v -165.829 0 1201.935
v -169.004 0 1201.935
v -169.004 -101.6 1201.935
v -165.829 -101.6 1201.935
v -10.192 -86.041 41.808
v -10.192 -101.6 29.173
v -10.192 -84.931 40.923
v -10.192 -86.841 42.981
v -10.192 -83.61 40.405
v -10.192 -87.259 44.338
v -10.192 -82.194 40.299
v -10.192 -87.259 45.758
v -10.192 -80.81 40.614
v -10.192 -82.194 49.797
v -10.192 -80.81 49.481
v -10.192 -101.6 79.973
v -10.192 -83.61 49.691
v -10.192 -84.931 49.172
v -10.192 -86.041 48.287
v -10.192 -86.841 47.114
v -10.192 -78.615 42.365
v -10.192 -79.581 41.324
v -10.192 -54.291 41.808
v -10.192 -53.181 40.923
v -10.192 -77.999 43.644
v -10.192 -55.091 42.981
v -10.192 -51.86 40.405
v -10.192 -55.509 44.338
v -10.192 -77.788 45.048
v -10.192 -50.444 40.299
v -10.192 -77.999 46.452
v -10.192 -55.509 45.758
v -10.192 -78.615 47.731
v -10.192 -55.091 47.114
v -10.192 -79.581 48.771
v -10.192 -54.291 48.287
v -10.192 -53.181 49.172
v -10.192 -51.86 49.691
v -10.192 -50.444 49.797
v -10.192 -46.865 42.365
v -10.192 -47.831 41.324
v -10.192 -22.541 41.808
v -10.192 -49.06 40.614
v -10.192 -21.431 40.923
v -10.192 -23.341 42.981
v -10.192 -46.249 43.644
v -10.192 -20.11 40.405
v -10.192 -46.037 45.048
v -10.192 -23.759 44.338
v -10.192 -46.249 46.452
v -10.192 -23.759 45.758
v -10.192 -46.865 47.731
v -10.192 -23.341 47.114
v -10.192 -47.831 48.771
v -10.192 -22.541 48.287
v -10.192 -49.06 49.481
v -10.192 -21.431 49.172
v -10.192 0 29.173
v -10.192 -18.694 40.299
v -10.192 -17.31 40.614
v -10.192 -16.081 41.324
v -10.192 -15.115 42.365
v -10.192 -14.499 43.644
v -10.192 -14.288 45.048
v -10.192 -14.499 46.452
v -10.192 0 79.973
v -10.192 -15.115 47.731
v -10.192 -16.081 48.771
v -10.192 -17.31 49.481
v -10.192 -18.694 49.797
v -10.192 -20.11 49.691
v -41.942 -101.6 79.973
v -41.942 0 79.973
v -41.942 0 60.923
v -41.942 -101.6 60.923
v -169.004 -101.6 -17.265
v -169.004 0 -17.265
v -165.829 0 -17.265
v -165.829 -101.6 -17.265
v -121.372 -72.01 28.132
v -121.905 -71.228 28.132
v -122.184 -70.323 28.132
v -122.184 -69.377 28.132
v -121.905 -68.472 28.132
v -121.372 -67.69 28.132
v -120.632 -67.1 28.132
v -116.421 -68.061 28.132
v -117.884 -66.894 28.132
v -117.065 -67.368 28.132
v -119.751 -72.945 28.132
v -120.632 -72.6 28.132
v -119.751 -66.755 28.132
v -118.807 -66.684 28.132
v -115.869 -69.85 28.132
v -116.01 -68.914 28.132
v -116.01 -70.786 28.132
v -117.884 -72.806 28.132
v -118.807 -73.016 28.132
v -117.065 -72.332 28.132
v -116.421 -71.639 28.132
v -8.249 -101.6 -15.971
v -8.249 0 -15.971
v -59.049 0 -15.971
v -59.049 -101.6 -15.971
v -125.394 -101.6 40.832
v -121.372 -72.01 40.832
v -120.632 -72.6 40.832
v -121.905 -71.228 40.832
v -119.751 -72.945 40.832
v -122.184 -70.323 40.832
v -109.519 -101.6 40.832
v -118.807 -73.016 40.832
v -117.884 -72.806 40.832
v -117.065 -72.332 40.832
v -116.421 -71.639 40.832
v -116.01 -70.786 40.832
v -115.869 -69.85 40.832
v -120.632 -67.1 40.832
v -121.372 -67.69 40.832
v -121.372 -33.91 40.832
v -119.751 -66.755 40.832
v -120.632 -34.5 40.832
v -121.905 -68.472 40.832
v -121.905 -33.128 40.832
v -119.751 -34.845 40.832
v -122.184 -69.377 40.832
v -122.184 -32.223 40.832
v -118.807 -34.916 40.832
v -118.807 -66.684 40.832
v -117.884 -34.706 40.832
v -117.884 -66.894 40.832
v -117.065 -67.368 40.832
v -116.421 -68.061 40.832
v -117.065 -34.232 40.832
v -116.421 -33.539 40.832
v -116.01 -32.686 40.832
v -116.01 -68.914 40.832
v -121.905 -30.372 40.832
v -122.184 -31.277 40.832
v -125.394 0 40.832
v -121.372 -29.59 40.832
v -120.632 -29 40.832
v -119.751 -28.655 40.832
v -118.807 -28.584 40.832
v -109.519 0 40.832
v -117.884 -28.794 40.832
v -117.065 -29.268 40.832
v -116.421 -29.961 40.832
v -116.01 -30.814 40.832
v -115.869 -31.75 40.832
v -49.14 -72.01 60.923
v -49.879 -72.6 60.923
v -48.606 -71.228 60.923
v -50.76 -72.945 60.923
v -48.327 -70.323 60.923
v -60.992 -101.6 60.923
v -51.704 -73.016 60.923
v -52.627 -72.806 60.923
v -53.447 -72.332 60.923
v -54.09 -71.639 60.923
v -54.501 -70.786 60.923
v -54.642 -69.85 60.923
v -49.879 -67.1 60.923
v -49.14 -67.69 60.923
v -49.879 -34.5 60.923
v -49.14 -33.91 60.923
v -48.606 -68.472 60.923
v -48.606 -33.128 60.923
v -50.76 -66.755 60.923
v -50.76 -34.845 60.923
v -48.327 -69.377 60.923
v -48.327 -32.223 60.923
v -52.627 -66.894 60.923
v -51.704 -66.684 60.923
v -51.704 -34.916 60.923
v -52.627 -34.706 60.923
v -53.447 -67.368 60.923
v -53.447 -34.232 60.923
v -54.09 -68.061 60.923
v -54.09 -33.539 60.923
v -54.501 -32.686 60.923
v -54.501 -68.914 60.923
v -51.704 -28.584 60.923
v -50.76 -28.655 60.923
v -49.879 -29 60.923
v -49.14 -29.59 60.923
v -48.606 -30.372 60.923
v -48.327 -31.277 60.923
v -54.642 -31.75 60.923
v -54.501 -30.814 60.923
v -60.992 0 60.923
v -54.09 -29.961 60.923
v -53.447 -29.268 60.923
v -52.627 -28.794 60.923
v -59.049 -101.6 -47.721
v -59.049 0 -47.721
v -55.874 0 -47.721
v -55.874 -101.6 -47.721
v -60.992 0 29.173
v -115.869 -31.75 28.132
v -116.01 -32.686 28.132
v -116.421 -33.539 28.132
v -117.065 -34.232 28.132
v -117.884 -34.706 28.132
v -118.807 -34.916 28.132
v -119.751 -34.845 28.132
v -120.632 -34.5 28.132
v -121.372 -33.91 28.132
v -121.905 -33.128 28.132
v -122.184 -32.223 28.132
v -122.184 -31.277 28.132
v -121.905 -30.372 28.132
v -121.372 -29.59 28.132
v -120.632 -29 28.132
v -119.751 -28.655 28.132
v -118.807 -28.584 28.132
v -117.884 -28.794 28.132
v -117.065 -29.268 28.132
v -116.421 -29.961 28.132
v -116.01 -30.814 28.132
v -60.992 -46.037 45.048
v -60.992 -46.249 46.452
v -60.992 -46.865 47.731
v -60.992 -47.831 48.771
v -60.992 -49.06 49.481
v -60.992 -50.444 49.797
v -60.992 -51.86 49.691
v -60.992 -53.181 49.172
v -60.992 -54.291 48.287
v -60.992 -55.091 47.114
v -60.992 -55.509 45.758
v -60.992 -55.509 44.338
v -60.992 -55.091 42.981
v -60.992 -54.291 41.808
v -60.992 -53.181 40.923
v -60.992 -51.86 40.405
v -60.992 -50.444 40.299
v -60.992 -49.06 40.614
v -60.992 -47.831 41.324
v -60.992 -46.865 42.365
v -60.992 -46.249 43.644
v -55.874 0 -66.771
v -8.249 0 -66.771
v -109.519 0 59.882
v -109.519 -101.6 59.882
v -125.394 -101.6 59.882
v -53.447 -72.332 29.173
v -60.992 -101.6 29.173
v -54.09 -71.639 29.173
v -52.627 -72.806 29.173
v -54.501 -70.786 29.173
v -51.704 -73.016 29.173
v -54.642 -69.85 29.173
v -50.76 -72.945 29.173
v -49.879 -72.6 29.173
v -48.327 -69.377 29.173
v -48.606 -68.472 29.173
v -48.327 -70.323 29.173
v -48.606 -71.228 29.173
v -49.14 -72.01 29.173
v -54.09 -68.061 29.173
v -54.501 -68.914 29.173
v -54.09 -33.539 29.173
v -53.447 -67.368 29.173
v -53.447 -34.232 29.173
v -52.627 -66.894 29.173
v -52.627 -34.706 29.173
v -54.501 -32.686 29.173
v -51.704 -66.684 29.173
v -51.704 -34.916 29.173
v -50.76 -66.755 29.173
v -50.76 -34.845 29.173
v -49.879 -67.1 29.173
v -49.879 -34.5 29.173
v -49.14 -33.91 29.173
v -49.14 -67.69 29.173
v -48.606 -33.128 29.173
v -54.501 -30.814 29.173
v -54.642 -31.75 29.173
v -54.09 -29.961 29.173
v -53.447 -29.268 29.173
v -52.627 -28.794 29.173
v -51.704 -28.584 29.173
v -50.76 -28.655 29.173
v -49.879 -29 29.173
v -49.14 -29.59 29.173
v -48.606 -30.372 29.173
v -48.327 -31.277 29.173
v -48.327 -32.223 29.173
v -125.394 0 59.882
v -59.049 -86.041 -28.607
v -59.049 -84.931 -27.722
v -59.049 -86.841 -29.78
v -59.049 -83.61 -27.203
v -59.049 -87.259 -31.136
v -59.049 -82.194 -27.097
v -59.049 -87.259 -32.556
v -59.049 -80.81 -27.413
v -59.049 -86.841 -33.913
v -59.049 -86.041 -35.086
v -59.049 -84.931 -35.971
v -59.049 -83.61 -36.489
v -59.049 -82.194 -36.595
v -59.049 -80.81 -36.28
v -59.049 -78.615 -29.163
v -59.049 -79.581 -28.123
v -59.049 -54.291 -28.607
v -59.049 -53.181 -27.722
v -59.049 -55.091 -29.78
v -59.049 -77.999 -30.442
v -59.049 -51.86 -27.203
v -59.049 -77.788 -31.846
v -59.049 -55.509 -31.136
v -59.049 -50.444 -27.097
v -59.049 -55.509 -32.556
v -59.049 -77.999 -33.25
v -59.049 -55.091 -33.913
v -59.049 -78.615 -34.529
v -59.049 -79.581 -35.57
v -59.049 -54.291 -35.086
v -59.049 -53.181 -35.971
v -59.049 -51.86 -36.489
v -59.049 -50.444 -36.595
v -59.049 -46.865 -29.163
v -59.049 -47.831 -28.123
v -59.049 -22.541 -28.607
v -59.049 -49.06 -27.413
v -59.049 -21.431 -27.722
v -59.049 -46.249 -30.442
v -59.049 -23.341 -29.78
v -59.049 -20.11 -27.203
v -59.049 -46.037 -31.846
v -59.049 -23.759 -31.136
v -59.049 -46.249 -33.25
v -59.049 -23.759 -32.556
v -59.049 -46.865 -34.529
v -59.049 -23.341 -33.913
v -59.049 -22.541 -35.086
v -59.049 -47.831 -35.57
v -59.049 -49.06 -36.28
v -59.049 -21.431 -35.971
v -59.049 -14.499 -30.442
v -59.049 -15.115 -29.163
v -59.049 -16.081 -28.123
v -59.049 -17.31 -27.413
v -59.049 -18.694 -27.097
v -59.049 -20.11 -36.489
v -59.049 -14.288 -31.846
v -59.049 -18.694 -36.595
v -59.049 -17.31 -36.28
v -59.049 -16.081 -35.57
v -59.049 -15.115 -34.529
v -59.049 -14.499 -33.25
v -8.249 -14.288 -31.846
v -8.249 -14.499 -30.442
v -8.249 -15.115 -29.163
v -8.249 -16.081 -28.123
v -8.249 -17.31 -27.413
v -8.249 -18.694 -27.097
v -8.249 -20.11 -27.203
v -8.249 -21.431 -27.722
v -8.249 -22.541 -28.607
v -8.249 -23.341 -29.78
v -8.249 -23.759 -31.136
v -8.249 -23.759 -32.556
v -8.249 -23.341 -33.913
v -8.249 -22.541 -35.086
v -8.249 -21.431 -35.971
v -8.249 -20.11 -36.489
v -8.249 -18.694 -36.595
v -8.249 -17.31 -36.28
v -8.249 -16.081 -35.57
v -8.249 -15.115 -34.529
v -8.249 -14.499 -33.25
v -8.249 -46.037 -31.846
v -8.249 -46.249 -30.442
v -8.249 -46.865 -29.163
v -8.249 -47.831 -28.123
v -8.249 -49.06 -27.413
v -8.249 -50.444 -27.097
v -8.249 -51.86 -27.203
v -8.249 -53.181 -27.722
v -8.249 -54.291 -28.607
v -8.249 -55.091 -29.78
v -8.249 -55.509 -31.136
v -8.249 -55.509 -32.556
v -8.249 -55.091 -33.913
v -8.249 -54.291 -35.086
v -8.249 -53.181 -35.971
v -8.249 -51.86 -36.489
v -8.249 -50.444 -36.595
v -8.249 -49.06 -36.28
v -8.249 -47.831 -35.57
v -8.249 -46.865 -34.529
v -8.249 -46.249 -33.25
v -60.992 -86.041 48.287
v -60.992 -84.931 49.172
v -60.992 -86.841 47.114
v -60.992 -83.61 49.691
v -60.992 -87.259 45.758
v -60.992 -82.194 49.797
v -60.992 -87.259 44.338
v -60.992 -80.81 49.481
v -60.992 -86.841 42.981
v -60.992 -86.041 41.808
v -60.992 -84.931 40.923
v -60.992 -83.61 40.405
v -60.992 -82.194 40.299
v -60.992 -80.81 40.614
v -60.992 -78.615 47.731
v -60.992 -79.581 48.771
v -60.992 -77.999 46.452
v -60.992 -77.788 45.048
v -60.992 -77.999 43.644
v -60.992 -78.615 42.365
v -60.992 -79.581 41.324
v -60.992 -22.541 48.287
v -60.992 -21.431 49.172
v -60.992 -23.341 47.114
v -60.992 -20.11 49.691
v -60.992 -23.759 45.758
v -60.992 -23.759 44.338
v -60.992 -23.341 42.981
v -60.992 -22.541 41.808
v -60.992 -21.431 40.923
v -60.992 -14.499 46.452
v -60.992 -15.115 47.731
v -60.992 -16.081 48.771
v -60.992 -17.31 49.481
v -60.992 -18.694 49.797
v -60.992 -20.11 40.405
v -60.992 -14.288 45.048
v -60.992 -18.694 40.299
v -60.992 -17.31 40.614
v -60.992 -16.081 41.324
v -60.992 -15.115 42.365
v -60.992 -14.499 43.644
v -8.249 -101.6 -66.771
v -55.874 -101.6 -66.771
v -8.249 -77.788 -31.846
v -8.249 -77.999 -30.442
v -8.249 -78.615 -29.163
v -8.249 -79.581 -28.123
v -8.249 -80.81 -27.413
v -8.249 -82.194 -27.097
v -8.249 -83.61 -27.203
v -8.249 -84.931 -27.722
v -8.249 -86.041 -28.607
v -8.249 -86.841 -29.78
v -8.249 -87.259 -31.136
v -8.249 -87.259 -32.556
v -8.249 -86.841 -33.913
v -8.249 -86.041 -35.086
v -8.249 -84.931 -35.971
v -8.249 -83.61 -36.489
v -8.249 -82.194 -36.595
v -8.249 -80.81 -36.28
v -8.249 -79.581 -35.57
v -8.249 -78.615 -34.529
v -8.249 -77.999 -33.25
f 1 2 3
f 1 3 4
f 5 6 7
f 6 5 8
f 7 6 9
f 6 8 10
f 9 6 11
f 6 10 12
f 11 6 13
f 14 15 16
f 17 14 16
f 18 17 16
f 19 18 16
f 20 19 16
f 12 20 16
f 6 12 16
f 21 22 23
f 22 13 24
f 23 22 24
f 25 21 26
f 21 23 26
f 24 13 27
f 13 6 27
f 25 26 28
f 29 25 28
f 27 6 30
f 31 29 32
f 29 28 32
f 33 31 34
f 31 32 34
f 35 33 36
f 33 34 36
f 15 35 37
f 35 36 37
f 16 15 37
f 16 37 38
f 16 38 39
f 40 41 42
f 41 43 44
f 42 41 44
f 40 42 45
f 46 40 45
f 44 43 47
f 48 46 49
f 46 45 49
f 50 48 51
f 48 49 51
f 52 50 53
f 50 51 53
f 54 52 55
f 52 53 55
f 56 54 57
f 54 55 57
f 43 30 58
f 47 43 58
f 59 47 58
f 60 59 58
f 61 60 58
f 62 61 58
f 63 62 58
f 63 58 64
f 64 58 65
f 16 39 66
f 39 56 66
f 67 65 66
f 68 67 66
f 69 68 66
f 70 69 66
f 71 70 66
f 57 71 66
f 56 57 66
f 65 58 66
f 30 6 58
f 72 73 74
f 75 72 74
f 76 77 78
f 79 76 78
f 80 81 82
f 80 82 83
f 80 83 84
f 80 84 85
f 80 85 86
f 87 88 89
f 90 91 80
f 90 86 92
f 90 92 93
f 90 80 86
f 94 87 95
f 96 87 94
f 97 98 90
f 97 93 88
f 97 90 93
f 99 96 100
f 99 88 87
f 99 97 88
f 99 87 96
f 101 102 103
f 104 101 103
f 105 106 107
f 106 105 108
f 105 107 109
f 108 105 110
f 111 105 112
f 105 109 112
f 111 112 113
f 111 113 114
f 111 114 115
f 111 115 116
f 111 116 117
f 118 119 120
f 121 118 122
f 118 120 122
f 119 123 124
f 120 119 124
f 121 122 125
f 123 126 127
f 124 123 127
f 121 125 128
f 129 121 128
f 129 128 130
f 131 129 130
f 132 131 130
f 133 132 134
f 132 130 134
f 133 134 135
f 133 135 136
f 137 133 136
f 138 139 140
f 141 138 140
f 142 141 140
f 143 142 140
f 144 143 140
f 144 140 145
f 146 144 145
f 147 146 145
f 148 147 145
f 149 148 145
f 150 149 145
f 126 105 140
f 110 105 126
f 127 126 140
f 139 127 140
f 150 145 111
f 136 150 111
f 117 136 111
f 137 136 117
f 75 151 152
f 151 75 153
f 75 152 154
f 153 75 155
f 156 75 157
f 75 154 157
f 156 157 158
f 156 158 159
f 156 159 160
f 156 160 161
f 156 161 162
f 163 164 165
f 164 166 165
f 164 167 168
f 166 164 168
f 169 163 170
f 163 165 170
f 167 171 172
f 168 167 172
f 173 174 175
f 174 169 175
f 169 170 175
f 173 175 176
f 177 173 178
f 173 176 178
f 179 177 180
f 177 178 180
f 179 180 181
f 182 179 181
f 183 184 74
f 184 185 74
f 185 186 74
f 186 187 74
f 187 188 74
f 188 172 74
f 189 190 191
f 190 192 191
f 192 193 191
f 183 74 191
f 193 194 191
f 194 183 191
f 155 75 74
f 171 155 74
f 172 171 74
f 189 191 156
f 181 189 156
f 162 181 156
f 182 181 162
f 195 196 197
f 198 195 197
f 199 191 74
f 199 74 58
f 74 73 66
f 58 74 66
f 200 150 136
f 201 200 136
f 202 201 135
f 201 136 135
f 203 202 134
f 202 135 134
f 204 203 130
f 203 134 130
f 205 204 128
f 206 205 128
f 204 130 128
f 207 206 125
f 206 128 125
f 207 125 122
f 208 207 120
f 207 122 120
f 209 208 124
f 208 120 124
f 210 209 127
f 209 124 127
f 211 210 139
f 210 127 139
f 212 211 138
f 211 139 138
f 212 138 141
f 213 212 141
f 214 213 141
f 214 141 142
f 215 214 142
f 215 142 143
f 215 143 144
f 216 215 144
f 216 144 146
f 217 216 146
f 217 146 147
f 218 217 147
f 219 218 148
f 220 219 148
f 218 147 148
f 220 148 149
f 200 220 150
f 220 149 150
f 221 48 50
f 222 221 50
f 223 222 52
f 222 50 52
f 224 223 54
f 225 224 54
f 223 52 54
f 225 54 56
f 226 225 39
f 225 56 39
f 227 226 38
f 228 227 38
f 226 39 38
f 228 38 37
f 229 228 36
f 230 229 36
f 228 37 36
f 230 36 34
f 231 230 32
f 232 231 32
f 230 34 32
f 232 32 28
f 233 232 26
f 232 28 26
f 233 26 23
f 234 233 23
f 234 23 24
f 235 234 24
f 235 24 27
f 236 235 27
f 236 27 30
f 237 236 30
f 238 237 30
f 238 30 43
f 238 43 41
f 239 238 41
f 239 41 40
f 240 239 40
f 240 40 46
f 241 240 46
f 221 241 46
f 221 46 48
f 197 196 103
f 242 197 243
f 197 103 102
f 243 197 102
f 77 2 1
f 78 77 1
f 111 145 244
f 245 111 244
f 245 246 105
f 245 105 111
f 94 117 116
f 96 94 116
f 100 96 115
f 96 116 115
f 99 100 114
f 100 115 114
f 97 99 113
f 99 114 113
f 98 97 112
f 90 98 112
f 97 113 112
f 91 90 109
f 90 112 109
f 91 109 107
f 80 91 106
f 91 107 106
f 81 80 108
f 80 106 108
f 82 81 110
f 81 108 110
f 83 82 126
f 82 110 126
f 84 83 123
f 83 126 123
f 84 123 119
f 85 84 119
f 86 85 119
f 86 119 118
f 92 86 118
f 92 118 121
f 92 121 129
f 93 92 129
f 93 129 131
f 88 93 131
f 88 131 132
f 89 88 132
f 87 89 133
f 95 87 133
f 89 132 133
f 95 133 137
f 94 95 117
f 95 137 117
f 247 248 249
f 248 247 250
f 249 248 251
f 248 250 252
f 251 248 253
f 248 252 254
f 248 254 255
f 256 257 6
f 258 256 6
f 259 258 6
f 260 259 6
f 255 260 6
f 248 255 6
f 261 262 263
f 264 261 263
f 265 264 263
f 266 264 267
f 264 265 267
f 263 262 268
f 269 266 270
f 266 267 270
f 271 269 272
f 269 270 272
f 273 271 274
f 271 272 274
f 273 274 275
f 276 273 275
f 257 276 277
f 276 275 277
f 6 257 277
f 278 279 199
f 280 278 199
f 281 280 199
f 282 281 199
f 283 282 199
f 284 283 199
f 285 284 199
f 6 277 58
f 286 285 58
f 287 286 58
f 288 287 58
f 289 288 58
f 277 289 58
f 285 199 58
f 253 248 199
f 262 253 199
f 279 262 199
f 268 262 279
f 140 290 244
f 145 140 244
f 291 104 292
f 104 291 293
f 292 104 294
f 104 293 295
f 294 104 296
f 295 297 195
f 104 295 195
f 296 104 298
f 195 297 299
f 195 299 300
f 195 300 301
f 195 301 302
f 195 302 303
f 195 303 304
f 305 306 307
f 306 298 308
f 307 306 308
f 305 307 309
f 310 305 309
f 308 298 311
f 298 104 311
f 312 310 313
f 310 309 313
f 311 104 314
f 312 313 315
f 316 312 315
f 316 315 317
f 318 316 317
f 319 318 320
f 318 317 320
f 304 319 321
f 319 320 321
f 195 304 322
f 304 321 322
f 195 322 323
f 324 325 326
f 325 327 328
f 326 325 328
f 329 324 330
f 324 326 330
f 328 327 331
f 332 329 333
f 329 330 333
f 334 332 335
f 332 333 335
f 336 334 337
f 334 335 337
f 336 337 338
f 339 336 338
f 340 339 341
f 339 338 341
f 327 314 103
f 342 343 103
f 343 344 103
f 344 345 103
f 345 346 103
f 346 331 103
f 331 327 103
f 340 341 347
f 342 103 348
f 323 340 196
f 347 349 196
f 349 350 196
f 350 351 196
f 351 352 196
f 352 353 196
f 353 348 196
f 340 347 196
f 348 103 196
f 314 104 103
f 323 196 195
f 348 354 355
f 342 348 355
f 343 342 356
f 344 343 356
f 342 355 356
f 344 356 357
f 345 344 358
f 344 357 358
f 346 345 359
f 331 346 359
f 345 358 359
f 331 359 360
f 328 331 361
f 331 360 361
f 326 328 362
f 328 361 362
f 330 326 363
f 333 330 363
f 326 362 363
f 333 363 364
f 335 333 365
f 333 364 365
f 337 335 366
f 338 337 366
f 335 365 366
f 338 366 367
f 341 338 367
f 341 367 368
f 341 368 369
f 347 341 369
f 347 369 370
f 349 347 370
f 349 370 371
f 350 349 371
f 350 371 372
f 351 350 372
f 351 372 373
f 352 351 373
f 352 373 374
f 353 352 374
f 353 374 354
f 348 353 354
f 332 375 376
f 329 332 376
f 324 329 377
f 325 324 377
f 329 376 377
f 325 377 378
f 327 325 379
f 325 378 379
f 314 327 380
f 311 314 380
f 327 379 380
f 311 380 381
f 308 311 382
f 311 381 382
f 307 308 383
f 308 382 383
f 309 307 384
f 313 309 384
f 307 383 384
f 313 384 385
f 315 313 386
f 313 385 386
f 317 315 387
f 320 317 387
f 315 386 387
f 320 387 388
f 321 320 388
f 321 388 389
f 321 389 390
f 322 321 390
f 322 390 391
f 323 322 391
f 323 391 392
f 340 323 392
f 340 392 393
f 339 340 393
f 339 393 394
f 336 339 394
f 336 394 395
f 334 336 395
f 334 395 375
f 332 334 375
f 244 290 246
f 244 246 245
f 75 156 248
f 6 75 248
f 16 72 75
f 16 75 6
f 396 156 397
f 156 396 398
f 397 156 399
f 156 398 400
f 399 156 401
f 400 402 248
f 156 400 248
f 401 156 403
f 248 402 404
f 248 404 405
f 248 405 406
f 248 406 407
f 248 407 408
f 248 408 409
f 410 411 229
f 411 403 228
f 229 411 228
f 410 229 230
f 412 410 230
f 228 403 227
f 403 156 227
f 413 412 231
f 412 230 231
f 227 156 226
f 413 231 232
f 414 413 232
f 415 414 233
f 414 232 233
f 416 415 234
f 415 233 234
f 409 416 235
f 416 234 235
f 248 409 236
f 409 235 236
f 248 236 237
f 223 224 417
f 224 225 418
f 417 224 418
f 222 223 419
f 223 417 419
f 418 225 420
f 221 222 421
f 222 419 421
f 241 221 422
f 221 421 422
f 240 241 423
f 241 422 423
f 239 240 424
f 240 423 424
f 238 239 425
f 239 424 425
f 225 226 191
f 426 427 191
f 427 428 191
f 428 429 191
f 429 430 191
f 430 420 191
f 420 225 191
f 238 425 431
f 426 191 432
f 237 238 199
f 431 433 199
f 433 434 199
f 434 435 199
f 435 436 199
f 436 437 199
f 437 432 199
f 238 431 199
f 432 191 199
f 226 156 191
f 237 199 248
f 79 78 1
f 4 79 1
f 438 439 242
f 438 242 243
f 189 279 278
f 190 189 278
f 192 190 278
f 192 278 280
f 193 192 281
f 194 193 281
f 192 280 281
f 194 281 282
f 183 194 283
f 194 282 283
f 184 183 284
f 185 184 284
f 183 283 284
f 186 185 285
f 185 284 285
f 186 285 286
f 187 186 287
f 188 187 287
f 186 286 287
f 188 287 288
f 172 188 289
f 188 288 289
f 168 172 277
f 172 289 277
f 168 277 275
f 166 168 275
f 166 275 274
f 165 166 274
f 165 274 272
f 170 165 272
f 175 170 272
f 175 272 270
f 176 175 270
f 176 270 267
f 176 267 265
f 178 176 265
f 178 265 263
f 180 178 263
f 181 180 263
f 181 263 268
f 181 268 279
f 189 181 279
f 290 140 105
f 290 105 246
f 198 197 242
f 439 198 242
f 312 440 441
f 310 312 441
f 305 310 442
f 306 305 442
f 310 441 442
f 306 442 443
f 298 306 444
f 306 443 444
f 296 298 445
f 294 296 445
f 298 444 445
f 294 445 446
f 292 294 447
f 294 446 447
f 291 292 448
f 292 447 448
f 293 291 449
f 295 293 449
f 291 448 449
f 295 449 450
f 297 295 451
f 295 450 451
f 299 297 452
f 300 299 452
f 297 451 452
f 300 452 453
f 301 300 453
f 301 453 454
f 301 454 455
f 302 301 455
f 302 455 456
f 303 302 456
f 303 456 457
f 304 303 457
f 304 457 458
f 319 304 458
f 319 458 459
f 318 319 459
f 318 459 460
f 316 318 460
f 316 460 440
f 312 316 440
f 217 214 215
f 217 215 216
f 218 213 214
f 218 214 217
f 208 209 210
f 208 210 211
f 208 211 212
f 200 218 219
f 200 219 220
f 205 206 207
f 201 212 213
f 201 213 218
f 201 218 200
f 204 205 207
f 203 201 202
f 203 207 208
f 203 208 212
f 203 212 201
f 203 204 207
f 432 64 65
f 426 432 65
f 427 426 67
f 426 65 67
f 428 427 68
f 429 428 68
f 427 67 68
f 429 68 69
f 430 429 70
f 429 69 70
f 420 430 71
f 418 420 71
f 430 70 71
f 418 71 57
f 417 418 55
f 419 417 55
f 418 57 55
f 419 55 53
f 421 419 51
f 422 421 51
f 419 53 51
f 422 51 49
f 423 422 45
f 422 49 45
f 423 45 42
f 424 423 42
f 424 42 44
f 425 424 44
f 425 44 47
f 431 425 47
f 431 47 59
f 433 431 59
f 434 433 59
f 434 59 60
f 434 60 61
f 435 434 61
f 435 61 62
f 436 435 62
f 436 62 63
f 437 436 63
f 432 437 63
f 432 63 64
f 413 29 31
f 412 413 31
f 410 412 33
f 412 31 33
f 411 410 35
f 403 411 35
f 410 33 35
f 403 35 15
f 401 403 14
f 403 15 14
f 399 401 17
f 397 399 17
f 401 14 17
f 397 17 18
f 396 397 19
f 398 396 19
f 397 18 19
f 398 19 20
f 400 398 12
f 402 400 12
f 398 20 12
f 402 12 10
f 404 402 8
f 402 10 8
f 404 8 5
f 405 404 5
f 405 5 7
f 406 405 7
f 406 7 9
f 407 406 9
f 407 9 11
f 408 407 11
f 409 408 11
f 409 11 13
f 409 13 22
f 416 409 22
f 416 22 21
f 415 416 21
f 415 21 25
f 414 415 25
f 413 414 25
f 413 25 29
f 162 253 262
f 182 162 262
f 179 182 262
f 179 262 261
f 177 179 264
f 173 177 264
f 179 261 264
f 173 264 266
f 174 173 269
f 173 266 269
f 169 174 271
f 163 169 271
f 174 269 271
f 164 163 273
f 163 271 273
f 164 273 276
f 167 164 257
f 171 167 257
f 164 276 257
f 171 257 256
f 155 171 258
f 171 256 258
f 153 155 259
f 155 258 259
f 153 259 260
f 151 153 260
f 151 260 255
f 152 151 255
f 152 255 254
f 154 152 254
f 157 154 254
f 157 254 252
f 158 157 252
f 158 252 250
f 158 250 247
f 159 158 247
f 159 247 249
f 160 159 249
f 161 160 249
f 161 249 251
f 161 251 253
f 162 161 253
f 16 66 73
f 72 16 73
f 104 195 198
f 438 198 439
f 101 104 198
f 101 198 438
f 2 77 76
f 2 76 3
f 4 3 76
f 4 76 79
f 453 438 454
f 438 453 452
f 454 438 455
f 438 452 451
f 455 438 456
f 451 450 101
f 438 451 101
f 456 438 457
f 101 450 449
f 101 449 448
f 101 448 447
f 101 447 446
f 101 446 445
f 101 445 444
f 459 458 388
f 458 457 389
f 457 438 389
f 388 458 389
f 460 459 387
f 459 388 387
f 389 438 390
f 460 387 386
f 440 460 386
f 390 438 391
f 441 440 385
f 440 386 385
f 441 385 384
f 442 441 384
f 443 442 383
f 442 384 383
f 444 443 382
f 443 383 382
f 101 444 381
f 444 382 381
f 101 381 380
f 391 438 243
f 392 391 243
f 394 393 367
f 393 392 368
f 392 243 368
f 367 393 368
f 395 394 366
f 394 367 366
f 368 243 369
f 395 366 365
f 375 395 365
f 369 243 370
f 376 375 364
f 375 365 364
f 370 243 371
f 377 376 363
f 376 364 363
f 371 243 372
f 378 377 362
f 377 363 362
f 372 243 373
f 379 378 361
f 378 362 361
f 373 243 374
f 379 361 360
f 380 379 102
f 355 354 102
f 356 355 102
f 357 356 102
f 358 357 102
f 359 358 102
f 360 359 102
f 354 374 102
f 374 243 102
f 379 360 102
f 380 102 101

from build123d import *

# Parameters (mm, degrees)
F0_W      = 15.875
F0_H      = 19.05
F1_DEPTH  = 101.6
F2_DEPTH  = 101.6
F3_DEPTH  = 101.6
F5_D      = 6.35
F7_D      = 9.525
F8_R      = 3.175
F9_DEPTH  = 12.7
F11_D     = 9.525
F12_W     = 3.175
F12_H     = 1219.2
F13_DEPTH = 101.6


with BuildPart() as f1:
    # F0 (on Front) → F1 (new body)
    with BuildSketch(Plane.XZ):
        with Locations((-117.4566584981, 50.3567663363)):
            Rectangle(F0_W, F0_H)
    extrude(amount=F1_DEPTH)

    # F8 (on face) → F9 (join)
    with BuildSketch(Plane(origin=(0, 0, 40.8317663363), x_dir=(1, 0, 0), z_dir=(0, 0, -1))):
        with Locations((-119.0441584981, 69.85)):
            Circle(F8_R)
        with Locations((-119.0441584981, 31.75)):
            Circle(F8_R)
    extrude(amount=F9_DEPTH)


with BuildPart() as f2:
    # F0 (on Front) → F2 (new body)
    with BuildSketch(Plane.XZ):
        Polygon((-41.9419813405, 60.9227498979), (-60.9919813405, 60.9227498979), (-60.9919813405, 29.1727498979), (-10.1919813405, 29.1727498979), (-10.1919813405, 79.9727498979), (-41.9419813405, 79.9727498979), align=None)
    extrude(amount=F2_DEPTH)

    # F5 (through all)
    with Locations(Plane.XY.offset(60.9227498979)):
        with Locations((-51.4669813405, -31.75), (-51.4669813405, -69.85)):
            Hole(F5_D / 2)

    # F7 (through all)
    with Locations(Plane(origin=(-60.9919813405, 0, 0), x_dir=(0, -1, 0), z_dir=(-1, 0, 0))):
        with Locations((19.05, 45.0477498979), (50.8, 45.0477498979), (82.55, 45.0477498979)):
            Hole(F7_D / 2)


with BuildPart() as f3:
    # F0 (on Front) → F3 (new body)
    with BuildSketch(Plane.XZ):
        Polygon((-8.2488123913, -15.9712382287), (-59.0488123913, -15.9712382287), (-59.0488123913, -47.7212382287), (-55.8738123913, -47.7212382287), (-55.8738123913, -66.7712382287), (-8.2488123913, -66.7712382287), align=None)
    extrude(amount=F3_DEPTH)

    # F11 (through all)
    with Locations(Plane(origin=(-59.0488123913, 0, 0), x_dir=(0, -1, 0), z_dir=(-1, 0, 0))):
        with Locations((19.05, -31.8462382287), (50.8, -31.8462382287), (82.55, -31.8462382287)):
            Hole(F11_D / 2)


with BuildPart() as f13:
    # F12 (on Front) → F13 (new body)
    with BuildSketch(Plane.XZ):
        with Locations((-167.4167439342, 592.335337542)):
            Rectangle(F12_W, F12_H)
    extrude(amount=F13_DEPTH)


solid = Compound([f1.part, f2.part, f3.part, f13.part])
